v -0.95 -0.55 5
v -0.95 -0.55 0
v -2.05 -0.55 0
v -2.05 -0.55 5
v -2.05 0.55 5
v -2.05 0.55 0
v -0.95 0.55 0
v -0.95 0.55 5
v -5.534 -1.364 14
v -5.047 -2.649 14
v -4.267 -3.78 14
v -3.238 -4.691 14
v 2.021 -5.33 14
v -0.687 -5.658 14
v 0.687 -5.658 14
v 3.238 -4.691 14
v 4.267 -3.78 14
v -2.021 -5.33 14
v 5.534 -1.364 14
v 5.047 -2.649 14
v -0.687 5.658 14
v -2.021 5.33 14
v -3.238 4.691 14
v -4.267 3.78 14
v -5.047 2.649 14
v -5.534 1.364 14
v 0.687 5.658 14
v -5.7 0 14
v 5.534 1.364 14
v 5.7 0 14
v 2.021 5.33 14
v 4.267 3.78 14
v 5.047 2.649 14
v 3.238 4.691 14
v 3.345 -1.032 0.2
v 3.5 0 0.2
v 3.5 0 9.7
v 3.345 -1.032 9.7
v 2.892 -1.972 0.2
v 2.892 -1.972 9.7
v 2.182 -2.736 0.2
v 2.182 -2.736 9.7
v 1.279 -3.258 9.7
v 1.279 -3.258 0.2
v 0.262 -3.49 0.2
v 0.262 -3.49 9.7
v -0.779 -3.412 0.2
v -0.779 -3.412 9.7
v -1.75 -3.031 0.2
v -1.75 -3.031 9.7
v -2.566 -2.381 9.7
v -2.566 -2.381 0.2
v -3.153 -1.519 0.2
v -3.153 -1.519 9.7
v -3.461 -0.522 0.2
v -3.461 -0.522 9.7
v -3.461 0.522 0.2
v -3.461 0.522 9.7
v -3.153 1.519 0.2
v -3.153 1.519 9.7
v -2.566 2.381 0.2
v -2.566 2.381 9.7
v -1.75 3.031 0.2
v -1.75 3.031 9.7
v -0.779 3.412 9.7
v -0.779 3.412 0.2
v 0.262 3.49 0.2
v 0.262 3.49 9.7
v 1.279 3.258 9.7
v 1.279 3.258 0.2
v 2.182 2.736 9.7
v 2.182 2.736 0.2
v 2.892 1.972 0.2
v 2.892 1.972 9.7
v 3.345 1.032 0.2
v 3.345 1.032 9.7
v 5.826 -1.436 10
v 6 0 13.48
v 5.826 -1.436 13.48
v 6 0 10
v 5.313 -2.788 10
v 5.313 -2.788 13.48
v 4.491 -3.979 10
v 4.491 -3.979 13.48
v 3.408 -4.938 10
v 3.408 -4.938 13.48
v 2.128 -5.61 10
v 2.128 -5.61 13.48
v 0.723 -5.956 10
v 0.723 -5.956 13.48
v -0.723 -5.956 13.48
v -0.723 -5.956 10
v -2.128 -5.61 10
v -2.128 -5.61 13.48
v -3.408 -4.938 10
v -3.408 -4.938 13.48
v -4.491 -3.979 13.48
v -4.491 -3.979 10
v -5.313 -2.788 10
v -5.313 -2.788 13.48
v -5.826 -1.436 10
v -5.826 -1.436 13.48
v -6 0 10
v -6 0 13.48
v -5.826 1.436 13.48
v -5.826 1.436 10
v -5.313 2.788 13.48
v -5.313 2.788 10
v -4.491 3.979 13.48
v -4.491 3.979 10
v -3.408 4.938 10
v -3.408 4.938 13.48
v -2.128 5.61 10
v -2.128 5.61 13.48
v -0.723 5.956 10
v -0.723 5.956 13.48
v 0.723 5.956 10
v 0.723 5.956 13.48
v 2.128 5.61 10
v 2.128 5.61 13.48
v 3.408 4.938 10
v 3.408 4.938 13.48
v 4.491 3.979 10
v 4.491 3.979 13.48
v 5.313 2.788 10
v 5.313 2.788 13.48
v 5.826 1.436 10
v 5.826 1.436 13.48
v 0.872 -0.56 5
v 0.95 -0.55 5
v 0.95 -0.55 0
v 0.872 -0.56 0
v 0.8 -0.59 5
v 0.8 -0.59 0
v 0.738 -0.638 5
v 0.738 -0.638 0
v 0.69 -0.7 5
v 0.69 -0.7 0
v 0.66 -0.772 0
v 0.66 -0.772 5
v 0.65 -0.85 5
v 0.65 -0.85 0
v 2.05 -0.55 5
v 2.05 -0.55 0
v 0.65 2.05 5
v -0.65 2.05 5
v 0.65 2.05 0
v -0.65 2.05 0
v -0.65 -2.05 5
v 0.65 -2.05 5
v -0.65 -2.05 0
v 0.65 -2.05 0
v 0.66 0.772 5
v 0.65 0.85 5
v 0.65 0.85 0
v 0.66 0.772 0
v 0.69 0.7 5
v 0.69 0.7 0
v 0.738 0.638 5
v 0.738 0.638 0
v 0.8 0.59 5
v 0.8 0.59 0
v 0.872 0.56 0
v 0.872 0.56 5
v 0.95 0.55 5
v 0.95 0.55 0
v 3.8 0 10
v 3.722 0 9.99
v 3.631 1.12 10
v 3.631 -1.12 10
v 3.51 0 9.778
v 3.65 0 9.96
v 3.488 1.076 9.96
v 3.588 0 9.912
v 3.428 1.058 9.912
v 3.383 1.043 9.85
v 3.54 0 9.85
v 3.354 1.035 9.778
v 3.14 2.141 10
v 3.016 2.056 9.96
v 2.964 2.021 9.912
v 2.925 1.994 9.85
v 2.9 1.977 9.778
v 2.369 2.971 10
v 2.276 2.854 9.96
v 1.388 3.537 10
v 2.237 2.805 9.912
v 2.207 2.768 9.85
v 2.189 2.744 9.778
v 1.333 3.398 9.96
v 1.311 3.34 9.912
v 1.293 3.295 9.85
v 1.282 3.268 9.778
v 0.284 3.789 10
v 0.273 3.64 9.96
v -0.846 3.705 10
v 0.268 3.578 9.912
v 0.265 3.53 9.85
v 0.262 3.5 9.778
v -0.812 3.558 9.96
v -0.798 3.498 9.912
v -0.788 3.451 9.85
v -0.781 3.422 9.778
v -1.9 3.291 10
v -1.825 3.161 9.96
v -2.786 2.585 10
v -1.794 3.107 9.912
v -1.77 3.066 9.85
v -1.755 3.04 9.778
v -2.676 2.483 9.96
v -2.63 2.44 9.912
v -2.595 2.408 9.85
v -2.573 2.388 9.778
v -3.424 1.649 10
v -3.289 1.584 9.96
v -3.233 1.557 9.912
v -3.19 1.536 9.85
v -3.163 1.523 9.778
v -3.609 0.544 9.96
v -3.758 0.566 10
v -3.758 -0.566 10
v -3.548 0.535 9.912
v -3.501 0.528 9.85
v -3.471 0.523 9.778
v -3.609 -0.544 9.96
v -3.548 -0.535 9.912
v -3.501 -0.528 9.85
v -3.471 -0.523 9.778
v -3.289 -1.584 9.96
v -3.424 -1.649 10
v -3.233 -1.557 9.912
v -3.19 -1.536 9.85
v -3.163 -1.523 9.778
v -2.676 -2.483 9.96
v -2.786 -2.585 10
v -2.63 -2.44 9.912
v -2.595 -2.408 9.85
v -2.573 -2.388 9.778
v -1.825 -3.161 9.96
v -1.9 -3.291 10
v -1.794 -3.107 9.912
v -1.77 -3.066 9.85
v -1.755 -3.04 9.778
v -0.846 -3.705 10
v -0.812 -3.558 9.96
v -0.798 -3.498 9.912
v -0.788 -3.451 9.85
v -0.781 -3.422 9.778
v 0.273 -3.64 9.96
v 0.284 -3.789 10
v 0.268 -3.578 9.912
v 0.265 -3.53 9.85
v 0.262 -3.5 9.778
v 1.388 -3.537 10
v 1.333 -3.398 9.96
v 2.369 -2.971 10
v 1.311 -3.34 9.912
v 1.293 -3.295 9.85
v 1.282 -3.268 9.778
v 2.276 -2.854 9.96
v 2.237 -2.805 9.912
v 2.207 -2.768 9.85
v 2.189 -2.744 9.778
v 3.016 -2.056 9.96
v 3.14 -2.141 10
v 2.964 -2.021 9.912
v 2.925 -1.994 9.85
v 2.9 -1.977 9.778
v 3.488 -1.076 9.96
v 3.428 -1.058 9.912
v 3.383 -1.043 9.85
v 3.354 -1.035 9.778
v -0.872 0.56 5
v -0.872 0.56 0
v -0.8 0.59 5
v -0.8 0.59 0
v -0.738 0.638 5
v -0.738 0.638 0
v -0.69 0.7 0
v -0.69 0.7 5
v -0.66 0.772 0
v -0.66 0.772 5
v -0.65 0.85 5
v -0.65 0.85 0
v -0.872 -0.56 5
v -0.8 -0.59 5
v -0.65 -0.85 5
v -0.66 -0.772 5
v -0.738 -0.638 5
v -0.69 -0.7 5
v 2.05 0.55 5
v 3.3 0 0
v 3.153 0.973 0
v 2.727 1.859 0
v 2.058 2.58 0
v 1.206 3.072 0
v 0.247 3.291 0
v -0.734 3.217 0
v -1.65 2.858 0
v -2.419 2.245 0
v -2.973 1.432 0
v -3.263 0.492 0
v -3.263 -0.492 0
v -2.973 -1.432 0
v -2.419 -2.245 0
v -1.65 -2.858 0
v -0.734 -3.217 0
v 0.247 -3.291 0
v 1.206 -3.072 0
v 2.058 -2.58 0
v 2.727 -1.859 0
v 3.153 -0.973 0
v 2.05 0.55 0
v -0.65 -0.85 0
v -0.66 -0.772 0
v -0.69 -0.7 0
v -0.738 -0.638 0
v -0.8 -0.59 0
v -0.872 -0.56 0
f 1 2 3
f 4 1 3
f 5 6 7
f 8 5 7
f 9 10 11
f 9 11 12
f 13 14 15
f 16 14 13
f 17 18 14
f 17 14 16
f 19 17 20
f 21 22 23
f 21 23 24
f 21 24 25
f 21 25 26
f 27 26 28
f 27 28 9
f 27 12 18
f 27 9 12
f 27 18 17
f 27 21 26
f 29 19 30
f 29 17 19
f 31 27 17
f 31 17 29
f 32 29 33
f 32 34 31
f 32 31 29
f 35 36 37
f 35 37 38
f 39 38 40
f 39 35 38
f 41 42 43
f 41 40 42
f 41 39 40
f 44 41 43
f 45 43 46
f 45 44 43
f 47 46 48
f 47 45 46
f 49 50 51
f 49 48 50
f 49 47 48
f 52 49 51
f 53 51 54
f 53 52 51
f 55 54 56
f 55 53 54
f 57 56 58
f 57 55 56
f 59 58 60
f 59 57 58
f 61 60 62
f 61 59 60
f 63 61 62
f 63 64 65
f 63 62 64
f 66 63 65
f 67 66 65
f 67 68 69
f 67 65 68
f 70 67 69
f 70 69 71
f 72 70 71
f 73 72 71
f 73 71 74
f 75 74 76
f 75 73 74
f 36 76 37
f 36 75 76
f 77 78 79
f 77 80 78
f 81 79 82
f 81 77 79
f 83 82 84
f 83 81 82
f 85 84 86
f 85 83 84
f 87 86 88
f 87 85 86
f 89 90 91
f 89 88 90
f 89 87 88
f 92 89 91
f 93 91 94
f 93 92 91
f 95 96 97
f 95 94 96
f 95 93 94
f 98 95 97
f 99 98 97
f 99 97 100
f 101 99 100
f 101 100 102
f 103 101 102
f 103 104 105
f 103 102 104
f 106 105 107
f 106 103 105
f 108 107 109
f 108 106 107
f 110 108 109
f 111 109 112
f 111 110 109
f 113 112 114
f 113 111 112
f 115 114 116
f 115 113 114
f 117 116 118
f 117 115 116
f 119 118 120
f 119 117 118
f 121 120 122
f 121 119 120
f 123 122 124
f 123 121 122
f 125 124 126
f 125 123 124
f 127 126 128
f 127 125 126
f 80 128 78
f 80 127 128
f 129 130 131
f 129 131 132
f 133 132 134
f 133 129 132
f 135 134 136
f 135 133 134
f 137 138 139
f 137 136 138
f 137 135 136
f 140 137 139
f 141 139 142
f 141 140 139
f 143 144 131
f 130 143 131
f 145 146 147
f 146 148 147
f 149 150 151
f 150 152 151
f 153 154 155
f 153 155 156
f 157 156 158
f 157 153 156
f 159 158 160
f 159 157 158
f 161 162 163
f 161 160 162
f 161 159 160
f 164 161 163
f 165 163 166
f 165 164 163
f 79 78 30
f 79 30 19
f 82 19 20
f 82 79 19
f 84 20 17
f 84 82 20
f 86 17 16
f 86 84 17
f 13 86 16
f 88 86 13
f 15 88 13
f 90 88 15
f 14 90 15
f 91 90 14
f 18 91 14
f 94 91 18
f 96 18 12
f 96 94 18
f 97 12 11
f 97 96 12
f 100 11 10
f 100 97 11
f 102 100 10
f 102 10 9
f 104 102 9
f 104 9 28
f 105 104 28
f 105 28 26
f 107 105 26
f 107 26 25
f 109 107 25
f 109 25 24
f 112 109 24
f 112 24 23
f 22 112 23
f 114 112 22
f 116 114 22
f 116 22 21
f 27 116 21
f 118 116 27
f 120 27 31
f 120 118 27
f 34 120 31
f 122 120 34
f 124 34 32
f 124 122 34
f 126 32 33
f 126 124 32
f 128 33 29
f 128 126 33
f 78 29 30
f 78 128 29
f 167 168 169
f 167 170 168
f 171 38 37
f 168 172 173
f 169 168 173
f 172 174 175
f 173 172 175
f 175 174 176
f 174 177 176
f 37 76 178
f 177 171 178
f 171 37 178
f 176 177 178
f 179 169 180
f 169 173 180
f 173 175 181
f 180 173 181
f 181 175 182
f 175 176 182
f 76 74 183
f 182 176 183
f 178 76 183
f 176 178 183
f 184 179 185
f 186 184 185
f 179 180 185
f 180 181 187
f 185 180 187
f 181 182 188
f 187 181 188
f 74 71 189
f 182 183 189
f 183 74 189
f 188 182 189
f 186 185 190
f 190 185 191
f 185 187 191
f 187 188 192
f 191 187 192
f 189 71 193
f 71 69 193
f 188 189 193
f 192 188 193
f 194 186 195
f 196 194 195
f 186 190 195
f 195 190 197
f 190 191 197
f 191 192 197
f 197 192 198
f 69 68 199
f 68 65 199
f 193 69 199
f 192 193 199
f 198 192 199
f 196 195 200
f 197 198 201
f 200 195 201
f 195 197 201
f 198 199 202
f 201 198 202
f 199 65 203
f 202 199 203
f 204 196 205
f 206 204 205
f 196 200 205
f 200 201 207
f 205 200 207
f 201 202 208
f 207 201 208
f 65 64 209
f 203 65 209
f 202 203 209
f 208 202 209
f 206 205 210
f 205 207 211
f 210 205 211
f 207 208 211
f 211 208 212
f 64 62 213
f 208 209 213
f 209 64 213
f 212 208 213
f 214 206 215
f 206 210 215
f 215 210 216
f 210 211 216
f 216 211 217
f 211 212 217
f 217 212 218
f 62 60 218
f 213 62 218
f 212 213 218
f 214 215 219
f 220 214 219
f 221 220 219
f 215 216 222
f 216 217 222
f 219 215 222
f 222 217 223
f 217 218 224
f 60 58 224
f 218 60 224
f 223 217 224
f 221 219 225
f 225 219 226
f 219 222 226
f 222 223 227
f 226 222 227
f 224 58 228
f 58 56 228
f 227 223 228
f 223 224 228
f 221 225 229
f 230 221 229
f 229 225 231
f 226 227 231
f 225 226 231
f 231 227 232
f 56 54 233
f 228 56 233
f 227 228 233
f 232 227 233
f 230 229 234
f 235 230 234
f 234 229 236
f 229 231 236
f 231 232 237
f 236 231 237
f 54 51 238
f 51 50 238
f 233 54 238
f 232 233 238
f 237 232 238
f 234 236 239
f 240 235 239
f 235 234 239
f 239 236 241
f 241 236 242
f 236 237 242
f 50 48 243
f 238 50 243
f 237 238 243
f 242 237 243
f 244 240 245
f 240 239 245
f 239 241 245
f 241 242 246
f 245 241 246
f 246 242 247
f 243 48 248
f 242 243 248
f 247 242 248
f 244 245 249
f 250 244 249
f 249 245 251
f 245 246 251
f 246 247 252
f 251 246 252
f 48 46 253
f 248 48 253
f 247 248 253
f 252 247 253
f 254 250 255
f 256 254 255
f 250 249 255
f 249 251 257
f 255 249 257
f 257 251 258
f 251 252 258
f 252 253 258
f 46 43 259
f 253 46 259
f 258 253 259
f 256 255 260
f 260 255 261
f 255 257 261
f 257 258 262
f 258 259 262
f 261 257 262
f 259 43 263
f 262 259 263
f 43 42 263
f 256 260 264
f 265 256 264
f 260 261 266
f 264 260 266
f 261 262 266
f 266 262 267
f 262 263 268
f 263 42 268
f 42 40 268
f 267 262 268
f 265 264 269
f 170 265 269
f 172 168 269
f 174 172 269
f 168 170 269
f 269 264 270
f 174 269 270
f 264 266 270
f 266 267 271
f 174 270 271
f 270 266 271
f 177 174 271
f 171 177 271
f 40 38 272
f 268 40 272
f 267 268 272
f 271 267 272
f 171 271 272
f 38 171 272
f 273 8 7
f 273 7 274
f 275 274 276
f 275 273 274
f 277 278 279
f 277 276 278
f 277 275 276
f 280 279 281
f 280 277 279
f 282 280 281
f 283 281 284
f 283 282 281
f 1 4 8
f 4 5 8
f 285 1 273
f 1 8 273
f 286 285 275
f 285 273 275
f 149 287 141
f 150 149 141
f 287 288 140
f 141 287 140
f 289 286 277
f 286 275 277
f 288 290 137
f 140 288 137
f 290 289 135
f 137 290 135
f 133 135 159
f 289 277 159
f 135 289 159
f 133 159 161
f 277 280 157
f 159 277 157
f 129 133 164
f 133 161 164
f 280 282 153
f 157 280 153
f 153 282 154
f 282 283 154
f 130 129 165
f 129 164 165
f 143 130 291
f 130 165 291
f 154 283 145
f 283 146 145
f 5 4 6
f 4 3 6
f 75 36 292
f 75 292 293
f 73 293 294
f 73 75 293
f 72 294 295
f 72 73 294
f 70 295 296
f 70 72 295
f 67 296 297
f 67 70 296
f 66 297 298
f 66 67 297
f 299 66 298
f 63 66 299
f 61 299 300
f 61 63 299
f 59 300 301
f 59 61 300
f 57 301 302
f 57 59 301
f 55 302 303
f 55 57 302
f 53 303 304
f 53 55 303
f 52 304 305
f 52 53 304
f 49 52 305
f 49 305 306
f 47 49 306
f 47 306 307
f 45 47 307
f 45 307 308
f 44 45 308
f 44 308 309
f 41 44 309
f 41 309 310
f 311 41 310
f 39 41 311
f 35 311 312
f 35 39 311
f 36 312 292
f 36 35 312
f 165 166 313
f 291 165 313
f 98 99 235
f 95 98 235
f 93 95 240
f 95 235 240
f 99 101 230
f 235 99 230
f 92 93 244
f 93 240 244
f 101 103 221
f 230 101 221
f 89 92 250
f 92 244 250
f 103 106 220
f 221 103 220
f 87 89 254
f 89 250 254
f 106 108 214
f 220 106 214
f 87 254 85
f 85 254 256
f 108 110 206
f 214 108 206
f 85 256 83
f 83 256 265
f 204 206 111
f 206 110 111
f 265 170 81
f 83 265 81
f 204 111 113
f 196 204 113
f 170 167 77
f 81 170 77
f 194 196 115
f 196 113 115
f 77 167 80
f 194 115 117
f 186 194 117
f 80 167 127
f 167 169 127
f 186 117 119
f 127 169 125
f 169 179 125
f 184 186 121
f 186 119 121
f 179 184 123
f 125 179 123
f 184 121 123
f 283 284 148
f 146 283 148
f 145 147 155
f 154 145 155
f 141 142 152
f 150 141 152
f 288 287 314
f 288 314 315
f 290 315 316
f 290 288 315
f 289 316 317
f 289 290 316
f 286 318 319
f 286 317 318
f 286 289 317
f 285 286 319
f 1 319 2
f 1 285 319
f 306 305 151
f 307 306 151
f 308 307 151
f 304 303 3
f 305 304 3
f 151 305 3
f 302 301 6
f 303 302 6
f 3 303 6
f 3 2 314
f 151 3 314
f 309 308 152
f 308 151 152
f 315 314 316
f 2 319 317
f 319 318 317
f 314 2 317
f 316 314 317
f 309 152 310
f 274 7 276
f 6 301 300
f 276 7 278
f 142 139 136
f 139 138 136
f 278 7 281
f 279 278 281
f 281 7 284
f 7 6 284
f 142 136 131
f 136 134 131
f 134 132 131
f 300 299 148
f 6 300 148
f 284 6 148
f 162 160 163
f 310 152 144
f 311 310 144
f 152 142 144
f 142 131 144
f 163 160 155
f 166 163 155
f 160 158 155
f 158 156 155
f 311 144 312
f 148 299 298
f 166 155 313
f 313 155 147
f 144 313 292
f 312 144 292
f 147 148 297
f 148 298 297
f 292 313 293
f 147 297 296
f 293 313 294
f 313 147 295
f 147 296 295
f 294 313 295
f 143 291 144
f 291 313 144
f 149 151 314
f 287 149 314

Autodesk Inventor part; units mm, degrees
ref_plane "YZ Plane" through (0, 0, 0) normal (1, 0, 0) x (0, 1, 0)
ref_plane "XZ Plane" through (0, 0, 0) normal (0, 1, 0) x (-1, 0, 0)
ref_plane "XY Plane" through (0, 0, 0) normal (0, 0, 1) x (1, 0, 0)
sketch "Skizze1" plane through (0, 0, 0) normal (0, 0, 1) x (1, 0, 0)
  line L0 (-2.05, 0.55) -> (2.05, 0.55)
  line L1 (2.05, 0.55) -> (2.05, -0.55)
  line L2 (2.05, -0.55) -> (-2.05, -0.55)
  line L3 (-2.05, -0.55) -> (-2.05, 0.55)
  line L4 (-0.65, 2.05) -> (0.65, 2.05)
  line L5 (0.65, 2.05) -> (0.65, -2.05)
  line L6 (0.65, -2.05) -> (-0.65, -2.05)
  line L7 (-0.65, -2.05) -> (-0.65, 2.05)
  circle A0 centre (0, 0) radius 3.5
  line L8 (-4.9, 0) -> (4.9, 0) construction
  line L9 (0, -4.9) -> (0, 4.9) construction
  point P0 (0.65, -0.55)
  point P1 (-0.65, -0.55)
  point P2 (-0.65, 0.55)
  point P3 (0.65, 0.55)
  dimension "d0" = 1.3
  dimension "d1" = 1.1
  dimension "d2" = 4.1
  dimension "d3" = 4.1
  dimension "d4" = 7
extrude "Extrusion1" add sketch "Skizze1" along normal blind 5
sketch "Skizze2" plane through (0, 0, 5) normal (0, 0, 1) x (1, 0, 0)
  circle A0 centre (0, 0) radius 3.5 projected
extrude "Extrusion2" add sketch "Skizze2" along normal blind 5
sketch "Skizze3" plane through (0, 0, 10) normal (0, 0, 1) x (1, 0, 0)
  circle A0 centre (0, 0) radius 6
  dimension "d9" = 12
extrude "Extrusion3" add sketch "Skizze3" along normal blind 4
chamfer "Fase1" distance 0.3 angle 60 1 edges at (-6, 0, 14) measured on face at (-0.7092, 1.4219, 14)
fillet "Rundung1" radius 0.3 1 edges at (-3.5, 0, 10)
chamfer "Fase2" distance 0.2 angle 45 1 edges at (-3.5, 0, 0)
fillet "Rundung2" radius 0.3 4 edges at (0.65, -0.55, 2.5) (-0.65, -0.55, 2.5) (0.65, 0.55, 2.5) (-0.65, 0.55, 2.5)
properties part number "Totmannknopf"
